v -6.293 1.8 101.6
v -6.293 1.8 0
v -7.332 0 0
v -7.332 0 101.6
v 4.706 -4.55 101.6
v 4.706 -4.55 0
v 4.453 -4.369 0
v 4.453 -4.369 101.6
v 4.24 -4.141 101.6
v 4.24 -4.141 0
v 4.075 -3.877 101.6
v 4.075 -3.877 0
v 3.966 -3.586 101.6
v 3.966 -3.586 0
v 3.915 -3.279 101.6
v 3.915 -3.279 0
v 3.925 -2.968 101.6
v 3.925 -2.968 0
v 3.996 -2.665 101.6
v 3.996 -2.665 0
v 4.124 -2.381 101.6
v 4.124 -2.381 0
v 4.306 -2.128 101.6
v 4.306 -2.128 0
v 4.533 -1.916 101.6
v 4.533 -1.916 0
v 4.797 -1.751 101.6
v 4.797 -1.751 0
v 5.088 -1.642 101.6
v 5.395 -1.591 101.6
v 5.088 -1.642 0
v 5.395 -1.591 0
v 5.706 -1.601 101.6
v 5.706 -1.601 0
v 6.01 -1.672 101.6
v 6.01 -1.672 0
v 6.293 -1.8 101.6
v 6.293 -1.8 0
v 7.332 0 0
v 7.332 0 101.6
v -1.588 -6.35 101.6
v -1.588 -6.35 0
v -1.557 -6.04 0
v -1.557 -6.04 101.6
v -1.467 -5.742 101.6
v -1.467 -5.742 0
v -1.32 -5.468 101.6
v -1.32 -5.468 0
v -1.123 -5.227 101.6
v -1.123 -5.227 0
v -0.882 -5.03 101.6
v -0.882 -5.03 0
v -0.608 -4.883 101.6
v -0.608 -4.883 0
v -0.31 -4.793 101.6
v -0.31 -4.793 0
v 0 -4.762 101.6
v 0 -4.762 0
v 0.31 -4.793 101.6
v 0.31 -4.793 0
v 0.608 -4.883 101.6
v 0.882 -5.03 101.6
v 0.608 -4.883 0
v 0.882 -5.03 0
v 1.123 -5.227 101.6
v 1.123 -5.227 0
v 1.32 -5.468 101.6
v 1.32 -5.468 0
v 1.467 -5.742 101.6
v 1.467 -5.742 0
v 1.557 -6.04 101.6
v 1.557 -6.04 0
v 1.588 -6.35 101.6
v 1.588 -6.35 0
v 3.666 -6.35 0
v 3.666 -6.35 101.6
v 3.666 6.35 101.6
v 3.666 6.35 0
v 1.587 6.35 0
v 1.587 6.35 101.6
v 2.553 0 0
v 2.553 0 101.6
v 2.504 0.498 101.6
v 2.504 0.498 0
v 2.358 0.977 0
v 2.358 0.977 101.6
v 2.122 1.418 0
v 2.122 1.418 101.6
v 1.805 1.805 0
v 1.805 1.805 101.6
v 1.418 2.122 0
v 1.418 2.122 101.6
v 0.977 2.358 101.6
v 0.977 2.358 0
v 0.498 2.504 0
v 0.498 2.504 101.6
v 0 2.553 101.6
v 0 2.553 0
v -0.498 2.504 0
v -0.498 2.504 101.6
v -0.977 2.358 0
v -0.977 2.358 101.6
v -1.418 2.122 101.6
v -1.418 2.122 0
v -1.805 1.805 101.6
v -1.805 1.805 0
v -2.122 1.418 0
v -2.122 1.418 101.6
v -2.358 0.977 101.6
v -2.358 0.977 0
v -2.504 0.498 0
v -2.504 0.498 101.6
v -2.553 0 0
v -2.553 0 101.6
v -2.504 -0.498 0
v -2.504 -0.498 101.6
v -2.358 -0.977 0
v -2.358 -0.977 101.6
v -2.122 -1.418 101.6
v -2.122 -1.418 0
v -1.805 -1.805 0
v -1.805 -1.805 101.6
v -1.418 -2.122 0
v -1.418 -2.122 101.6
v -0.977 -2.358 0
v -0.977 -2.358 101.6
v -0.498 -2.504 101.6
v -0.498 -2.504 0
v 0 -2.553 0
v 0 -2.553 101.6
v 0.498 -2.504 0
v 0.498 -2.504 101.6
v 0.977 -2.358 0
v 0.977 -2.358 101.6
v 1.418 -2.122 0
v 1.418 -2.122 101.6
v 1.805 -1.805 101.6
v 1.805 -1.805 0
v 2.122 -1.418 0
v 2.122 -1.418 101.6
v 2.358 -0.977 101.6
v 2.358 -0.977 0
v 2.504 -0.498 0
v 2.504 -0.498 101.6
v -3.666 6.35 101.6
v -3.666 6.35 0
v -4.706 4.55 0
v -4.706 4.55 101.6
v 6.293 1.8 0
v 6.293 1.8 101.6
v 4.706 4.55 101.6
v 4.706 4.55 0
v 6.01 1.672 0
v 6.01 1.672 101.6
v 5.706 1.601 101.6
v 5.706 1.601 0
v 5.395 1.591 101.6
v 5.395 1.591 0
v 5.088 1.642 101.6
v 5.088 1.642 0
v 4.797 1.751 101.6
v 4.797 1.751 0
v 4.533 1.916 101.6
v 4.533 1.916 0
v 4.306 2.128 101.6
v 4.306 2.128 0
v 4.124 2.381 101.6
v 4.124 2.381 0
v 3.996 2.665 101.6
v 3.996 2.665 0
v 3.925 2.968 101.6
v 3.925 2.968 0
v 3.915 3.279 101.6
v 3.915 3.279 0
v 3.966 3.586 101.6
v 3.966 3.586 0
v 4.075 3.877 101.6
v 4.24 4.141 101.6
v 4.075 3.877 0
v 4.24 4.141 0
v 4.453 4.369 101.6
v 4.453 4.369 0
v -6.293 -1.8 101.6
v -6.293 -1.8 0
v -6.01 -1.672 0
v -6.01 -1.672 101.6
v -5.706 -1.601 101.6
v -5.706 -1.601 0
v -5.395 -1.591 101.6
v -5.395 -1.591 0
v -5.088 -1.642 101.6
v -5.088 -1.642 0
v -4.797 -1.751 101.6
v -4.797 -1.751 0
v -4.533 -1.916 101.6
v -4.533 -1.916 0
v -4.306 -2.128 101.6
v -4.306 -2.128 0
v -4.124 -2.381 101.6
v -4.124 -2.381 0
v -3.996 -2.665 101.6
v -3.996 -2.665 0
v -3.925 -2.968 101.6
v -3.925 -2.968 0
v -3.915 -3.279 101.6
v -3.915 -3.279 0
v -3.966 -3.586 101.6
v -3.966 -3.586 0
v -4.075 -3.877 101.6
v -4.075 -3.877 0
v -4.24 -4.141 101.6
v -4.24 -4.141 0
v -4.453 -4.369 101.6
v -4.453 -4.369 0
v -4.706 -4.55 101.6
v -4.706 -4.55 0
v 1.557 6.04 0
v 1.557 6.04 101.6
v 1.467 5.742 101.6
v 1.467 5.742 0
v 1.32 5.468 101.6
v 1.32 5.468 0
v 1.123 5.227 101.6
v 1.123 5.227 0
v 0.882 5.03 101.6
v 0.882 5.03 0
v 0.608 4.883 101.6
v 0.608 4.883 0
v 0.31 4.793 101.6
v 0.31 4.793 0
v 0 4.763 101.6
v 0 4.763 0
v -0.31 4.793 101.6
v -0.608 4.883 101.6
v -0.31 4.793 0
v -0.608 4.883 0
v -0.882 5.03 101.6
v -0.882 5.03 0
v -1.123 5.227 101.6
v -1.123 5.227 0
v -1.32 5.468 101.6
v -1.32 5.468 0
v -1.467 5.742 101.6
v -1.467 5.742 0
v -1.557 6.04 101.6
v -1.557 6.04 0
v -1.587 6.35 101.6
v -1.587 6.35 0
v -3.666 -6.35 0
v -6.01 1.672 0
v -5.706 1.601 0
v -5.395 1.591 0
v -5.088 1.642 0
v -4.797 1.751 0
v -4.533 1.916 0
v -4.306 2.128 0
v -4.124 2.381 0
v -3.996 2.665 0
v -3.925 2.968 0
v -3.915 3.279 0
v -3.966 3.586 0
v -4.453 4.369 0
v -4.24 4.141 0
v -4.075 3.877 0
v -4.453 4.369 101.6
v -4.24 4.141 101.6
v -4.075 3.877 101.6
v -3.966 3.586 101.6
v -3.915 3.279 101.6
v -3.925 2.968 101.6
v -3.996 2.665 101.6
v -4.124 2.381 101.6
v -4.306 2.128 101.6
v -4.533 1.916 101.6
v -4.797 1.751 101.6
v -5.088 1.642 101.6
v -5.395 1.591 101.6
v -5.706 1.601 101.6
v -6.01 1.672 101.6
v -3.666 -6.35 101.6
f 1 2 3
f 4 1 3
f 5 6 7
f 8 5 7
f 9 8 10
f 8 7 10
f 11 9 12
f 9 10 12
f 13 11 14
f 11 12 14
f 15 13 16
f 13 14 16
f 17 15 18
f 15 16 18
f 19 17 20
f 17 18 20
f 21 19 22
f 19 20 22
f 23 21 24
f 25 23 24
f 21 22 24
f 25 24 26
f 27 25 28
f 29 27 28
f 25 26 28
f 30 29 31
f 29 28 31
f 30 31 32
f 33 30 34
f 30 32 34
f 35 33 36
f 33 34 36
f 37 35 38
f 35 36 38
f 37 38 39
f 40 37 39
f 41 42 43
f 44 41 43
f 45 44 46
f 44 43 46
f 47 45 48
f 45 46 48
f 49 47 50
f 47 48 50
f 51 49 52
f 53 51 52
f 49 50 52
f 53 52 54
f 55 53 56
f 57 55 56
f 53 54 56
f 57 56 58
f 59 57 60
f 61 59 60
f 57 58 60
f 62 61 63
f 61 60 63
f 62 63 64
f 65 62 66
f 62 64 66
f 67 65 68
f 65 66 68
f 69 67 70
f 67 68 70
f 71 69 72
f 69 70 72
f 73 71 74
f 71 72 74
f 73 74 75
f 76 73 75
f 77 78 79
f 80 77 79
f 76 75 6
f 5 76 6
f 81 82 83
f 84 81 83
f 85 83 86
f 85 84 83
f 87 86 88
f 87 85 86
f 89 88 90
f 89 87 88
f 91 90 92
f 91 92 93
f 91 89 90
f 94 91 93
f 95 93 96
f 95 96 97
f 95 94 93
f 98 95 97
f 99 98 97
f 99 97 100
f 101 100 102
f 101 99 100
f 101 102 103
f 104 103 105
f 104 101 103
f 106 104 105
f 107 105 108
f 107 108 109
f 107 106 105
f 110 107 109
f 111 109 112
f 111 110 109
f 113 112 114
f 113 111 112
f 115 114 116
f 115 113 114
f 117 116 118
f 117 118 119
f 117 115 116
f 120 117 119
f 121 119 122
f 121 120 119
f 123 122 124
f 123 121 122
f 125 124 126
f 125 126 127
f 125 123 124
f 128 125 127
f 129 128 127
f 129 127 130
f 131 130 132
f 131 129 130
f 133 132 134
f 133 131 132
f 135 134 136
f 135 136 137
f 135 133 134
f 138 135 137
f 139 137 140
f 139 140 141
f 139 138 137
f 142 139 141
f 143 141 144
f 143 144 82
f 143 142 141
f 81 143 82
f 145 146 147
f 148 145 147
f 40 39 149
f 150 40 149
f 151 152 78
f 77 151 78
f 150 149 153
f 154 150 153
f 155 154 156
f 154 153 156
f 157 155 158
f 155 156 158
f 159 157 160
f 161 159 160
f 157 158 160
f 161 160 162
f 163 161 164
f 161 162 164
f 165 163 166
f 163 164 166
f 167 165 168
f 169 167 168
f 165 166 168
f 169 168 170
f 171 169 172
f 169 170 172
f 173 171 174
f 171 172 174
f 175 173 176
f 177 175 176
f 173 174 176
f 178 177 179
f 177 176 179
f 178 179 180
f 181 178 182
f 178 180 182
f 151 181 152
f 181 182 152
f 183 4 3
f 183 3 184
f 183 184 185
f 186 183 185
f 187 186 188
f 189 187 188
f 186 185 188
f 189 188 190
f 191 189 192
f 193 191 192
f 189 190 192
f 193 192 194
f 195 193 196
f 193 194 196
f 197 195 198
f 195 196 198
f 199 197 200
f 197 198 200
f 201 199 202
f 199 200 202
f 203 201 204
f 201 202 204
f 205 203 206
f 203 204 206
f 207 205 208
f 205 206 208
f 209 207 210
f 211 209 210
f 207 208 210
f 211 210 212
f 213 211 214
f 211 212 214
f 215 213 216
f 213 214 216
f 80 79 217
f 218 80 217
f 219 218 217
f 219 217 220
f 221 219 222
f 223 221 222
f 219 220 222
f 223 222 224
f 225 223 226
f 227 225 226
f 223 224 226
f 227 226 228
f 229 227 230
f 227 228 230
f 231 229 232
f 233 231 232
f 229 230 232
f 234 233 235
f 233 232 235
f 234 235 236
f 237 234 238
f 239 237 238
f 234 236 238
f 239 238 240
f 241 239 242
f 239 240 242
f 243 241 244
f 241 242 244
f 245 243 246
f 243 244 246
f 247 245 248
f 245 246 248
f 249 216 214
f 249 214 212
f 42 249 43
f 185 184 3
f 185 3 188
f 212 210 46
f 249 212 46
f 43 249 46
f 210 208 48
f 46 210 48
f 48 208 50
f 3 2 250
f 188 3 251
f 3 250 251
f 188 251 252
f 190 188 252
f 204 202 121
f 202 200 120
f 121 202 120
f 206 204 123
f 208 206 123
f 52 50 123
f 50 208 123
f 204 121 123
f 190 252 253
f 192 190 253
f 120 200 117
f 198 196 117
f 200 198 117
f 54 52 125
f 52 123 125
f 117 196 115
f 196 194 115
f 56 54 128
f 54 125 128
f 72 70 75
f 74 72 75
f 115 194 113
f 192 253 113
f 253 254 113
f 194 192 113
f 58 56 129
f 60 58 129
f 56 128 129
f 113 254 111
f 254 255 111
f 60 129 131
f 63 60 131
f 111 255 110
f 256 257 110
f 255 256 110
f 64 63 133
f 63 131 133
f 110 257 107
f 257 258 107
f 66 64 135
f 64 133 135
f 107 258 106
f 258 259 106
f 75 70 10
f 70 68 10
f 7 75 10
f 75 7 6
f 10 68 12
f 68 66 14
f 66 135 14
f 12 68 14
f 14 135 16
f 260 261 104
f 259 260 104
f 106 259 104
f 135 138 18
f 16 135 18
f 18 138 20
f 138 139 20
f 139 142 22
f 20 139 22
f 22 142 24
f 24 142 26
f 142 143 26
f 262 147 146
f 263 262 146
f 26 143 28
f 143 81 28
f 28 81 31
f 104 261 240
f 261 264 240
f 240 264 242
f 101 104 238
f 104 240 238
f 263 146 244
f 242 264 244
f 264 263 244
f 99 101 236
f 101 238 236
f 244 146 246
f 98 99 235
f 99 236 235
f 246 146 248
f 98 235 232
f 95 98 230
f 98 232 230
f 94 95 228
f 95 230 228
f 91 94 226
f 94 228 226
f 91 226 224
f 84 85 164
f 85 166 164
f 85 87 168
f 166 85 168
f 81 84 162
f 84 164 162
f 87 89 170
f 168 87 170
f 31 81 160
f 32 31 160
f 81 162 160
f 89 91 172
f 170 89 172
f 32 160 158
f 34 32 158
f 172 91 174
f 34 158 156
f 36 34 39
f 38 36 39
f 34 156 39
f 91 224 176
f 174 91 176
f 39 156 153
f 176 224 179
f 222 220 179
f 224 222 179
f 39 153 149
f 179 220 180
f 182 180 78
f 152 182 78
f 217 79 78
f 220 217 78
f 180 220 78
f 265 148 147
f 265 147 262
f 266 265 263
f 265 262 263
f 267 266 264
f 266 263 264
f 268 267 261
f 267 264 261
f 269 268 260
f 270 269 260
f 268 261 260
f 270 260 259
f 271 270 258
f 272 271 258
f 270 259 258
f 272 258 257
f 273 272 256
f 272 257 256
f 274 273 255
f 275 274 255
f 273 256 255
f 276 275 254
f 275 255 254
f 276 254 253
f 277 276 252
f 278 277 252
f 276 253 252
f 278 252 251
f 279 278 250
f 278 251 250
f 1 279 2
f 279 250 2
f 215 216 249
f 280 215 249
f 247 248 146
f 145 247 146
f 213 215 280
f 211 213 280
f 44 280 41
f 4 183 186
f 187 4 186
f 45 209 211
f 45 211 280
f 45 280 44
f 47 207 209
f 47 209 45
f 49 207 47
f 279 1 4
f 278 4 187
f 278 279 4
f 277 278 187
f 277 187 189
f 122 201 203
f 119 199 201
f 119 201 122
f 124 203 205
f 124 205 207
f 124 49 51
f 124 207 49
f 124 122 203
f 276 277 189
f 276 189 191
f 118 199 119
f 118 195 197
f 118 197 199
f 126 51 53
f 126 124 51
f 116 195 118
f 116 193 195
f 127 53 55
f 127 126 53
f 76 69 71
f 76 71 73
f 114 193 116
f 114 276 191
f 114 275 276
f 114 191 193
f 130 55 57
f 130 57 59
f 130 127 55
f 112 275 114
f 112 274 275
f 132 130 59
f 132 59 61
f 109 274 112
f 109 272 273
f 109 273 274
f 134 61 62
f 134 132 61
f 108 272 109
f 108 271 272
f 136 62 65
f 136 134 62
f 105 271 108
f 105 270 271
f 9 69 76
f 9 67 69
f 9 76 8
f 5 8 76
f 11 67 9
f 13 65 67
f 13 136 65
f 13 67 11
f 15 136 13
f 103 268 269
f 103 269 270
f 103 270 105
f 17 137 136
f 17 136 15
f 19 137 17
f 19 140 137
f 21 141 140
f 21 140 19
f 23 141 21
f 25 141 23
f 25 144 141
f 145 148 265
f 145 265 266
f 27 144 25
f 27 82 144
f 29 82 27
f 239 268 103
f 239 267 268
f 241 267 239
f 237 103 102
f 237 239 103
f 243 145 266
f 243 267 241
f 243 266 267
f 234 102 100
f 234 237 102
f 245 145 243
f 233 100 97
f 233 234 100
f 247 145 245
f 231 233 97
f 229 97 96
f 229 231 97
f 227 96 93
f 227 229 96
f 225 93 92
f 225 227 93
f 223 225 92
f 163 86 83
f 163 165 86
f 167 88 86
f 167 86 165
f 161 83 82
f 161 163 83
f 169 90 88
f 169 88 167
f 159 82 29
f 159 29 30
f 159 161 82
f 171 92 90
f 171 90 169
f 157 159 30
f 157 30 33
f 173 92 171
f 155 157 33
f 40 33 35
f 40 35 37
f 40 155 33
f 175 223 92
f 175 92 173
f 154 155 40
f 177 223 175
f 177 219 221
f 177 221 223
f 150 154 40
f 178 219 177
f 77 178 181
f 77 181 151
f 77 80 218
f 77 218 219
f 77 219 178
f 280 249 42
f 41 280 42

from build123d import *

# Parameters (mm, degrees)
BOSS_EXTRUDE1_DEPTH                         = 101.6
SKETCH2_R                                   = 1.5875
CUT_EXTRUDE1_DEPTH                          = 101.6
CBORE_FOR_10_SOCKET_HEAD_CAP_SCREW2_OUT_R   = 2.5527
CBORE_FOR_10_SOCKET_HEAD_CAP_SCREW2_OUT_R_2 = 1.5875
CBORE_FOR_10_SOCKET_HEAD_CAP_SCREW2_DEPTH   = 101.6


# Read off the part's stored shape, not the designer's step: CBORE for #10 Socket Head Cap Screw2
with BuildPart() as part:
    # Sketch1 → Boss-Extrude1 (new body)
    with BuildSketch(Plane.XY):
        with BuildLine():
            Line((-4.70551159, -4.549815043), (-3.666174521, -6.349999904))
            Line((-3.666174521, -6.349999904), (-1.587501923, -6.349999904))
            ThreePointArc((-1.587501923, -6.349999904), (-3.85e-07, -4.762498365), (1.587501923, -6.349999904))
            Line((1.587501923, -6.349999904), (3.666173825, -6.349999904))
            Line((3.666173825, -6.349999904), (4.705510929, -4.549815232))
            ThreePointArc((4.705510929, -4.549815232), (4.124445601, -2.381249904), (6.293010929, -1.800184575))
            Line((6.293010929, -1.800184575), (7.332348034, 9.6e-08))
            Line((7.332348034, 9.6e-08), (6.293011178, 1.800184715))
            ThreePointArc((6.293011178, 1.800184715), (4.124445902, 2.381250241), (4.705511428, 4.549815516))
            Line((4.705511428, 4.549815516), (3.666174521, 6.350000222))
            Line((3.666174521, 6.350000222), (1.587498077, 6.350000222))
            ThreePointArc((1.587498077, 6.350000222), (3.85e-07, 4.76250253), (-1.587498077, 6.350000222))
            Line((-1.587498077, 6.350000222), (-3.666173825, 6.350000222))
            Line((-3.666173825, 6.350000222), (-4.705511038, 4.549815614))
            ThreePointArc((-4.705511038, 4.549815614), (-4.124445841, 2.38125025), (-6.293011205, 1.800185053))
            Line((-6.293011205, 1.800185053), (-7.332348419, 4.44e-07))
            Line((-7.332348419, 4.44e-07), (-6.293011423, -1.80018429))
            ThreePointArc((-6.293011423, -1.80018429), (-4.12444613, -2.38124975), (-4.70551159, -4.549815043))
        make_face()
    extrude(amount=BOSS_EXTRUDE1_DEPTH)

    # Sketch2 → Cut-Extrude1 (cut)
    with BuildSketch(Plane.XY.offset(101.6)):
        Circle(SKETCH2_R)
    extrude(amount=-CUT_EXTRUDE1_DEPTH, mode=Mode.SUBTRACT)

    # CBORE for #10 Socket Head Cap Screw2 out → CBORE for #10 Socket Head Cap Screw2 (cut)
    with BuildSketch(Plane.XY):
        Circle(CBORE_FOR_10_SOCKET_HEAD_CAP_SCREW2_OUT_R)
        Circle(CBORE_FOR_10_SOCKET_HEAD_CAP_SCREW2_OUT_R_2, mode=Mode.SUBTRACT)
    extrude(amount=CBORE_FOR_10_SOCKET_HEAD_CAP_SCREW2_DEPTH, mode=Mode.SUBTRACT)


solid = part.part
